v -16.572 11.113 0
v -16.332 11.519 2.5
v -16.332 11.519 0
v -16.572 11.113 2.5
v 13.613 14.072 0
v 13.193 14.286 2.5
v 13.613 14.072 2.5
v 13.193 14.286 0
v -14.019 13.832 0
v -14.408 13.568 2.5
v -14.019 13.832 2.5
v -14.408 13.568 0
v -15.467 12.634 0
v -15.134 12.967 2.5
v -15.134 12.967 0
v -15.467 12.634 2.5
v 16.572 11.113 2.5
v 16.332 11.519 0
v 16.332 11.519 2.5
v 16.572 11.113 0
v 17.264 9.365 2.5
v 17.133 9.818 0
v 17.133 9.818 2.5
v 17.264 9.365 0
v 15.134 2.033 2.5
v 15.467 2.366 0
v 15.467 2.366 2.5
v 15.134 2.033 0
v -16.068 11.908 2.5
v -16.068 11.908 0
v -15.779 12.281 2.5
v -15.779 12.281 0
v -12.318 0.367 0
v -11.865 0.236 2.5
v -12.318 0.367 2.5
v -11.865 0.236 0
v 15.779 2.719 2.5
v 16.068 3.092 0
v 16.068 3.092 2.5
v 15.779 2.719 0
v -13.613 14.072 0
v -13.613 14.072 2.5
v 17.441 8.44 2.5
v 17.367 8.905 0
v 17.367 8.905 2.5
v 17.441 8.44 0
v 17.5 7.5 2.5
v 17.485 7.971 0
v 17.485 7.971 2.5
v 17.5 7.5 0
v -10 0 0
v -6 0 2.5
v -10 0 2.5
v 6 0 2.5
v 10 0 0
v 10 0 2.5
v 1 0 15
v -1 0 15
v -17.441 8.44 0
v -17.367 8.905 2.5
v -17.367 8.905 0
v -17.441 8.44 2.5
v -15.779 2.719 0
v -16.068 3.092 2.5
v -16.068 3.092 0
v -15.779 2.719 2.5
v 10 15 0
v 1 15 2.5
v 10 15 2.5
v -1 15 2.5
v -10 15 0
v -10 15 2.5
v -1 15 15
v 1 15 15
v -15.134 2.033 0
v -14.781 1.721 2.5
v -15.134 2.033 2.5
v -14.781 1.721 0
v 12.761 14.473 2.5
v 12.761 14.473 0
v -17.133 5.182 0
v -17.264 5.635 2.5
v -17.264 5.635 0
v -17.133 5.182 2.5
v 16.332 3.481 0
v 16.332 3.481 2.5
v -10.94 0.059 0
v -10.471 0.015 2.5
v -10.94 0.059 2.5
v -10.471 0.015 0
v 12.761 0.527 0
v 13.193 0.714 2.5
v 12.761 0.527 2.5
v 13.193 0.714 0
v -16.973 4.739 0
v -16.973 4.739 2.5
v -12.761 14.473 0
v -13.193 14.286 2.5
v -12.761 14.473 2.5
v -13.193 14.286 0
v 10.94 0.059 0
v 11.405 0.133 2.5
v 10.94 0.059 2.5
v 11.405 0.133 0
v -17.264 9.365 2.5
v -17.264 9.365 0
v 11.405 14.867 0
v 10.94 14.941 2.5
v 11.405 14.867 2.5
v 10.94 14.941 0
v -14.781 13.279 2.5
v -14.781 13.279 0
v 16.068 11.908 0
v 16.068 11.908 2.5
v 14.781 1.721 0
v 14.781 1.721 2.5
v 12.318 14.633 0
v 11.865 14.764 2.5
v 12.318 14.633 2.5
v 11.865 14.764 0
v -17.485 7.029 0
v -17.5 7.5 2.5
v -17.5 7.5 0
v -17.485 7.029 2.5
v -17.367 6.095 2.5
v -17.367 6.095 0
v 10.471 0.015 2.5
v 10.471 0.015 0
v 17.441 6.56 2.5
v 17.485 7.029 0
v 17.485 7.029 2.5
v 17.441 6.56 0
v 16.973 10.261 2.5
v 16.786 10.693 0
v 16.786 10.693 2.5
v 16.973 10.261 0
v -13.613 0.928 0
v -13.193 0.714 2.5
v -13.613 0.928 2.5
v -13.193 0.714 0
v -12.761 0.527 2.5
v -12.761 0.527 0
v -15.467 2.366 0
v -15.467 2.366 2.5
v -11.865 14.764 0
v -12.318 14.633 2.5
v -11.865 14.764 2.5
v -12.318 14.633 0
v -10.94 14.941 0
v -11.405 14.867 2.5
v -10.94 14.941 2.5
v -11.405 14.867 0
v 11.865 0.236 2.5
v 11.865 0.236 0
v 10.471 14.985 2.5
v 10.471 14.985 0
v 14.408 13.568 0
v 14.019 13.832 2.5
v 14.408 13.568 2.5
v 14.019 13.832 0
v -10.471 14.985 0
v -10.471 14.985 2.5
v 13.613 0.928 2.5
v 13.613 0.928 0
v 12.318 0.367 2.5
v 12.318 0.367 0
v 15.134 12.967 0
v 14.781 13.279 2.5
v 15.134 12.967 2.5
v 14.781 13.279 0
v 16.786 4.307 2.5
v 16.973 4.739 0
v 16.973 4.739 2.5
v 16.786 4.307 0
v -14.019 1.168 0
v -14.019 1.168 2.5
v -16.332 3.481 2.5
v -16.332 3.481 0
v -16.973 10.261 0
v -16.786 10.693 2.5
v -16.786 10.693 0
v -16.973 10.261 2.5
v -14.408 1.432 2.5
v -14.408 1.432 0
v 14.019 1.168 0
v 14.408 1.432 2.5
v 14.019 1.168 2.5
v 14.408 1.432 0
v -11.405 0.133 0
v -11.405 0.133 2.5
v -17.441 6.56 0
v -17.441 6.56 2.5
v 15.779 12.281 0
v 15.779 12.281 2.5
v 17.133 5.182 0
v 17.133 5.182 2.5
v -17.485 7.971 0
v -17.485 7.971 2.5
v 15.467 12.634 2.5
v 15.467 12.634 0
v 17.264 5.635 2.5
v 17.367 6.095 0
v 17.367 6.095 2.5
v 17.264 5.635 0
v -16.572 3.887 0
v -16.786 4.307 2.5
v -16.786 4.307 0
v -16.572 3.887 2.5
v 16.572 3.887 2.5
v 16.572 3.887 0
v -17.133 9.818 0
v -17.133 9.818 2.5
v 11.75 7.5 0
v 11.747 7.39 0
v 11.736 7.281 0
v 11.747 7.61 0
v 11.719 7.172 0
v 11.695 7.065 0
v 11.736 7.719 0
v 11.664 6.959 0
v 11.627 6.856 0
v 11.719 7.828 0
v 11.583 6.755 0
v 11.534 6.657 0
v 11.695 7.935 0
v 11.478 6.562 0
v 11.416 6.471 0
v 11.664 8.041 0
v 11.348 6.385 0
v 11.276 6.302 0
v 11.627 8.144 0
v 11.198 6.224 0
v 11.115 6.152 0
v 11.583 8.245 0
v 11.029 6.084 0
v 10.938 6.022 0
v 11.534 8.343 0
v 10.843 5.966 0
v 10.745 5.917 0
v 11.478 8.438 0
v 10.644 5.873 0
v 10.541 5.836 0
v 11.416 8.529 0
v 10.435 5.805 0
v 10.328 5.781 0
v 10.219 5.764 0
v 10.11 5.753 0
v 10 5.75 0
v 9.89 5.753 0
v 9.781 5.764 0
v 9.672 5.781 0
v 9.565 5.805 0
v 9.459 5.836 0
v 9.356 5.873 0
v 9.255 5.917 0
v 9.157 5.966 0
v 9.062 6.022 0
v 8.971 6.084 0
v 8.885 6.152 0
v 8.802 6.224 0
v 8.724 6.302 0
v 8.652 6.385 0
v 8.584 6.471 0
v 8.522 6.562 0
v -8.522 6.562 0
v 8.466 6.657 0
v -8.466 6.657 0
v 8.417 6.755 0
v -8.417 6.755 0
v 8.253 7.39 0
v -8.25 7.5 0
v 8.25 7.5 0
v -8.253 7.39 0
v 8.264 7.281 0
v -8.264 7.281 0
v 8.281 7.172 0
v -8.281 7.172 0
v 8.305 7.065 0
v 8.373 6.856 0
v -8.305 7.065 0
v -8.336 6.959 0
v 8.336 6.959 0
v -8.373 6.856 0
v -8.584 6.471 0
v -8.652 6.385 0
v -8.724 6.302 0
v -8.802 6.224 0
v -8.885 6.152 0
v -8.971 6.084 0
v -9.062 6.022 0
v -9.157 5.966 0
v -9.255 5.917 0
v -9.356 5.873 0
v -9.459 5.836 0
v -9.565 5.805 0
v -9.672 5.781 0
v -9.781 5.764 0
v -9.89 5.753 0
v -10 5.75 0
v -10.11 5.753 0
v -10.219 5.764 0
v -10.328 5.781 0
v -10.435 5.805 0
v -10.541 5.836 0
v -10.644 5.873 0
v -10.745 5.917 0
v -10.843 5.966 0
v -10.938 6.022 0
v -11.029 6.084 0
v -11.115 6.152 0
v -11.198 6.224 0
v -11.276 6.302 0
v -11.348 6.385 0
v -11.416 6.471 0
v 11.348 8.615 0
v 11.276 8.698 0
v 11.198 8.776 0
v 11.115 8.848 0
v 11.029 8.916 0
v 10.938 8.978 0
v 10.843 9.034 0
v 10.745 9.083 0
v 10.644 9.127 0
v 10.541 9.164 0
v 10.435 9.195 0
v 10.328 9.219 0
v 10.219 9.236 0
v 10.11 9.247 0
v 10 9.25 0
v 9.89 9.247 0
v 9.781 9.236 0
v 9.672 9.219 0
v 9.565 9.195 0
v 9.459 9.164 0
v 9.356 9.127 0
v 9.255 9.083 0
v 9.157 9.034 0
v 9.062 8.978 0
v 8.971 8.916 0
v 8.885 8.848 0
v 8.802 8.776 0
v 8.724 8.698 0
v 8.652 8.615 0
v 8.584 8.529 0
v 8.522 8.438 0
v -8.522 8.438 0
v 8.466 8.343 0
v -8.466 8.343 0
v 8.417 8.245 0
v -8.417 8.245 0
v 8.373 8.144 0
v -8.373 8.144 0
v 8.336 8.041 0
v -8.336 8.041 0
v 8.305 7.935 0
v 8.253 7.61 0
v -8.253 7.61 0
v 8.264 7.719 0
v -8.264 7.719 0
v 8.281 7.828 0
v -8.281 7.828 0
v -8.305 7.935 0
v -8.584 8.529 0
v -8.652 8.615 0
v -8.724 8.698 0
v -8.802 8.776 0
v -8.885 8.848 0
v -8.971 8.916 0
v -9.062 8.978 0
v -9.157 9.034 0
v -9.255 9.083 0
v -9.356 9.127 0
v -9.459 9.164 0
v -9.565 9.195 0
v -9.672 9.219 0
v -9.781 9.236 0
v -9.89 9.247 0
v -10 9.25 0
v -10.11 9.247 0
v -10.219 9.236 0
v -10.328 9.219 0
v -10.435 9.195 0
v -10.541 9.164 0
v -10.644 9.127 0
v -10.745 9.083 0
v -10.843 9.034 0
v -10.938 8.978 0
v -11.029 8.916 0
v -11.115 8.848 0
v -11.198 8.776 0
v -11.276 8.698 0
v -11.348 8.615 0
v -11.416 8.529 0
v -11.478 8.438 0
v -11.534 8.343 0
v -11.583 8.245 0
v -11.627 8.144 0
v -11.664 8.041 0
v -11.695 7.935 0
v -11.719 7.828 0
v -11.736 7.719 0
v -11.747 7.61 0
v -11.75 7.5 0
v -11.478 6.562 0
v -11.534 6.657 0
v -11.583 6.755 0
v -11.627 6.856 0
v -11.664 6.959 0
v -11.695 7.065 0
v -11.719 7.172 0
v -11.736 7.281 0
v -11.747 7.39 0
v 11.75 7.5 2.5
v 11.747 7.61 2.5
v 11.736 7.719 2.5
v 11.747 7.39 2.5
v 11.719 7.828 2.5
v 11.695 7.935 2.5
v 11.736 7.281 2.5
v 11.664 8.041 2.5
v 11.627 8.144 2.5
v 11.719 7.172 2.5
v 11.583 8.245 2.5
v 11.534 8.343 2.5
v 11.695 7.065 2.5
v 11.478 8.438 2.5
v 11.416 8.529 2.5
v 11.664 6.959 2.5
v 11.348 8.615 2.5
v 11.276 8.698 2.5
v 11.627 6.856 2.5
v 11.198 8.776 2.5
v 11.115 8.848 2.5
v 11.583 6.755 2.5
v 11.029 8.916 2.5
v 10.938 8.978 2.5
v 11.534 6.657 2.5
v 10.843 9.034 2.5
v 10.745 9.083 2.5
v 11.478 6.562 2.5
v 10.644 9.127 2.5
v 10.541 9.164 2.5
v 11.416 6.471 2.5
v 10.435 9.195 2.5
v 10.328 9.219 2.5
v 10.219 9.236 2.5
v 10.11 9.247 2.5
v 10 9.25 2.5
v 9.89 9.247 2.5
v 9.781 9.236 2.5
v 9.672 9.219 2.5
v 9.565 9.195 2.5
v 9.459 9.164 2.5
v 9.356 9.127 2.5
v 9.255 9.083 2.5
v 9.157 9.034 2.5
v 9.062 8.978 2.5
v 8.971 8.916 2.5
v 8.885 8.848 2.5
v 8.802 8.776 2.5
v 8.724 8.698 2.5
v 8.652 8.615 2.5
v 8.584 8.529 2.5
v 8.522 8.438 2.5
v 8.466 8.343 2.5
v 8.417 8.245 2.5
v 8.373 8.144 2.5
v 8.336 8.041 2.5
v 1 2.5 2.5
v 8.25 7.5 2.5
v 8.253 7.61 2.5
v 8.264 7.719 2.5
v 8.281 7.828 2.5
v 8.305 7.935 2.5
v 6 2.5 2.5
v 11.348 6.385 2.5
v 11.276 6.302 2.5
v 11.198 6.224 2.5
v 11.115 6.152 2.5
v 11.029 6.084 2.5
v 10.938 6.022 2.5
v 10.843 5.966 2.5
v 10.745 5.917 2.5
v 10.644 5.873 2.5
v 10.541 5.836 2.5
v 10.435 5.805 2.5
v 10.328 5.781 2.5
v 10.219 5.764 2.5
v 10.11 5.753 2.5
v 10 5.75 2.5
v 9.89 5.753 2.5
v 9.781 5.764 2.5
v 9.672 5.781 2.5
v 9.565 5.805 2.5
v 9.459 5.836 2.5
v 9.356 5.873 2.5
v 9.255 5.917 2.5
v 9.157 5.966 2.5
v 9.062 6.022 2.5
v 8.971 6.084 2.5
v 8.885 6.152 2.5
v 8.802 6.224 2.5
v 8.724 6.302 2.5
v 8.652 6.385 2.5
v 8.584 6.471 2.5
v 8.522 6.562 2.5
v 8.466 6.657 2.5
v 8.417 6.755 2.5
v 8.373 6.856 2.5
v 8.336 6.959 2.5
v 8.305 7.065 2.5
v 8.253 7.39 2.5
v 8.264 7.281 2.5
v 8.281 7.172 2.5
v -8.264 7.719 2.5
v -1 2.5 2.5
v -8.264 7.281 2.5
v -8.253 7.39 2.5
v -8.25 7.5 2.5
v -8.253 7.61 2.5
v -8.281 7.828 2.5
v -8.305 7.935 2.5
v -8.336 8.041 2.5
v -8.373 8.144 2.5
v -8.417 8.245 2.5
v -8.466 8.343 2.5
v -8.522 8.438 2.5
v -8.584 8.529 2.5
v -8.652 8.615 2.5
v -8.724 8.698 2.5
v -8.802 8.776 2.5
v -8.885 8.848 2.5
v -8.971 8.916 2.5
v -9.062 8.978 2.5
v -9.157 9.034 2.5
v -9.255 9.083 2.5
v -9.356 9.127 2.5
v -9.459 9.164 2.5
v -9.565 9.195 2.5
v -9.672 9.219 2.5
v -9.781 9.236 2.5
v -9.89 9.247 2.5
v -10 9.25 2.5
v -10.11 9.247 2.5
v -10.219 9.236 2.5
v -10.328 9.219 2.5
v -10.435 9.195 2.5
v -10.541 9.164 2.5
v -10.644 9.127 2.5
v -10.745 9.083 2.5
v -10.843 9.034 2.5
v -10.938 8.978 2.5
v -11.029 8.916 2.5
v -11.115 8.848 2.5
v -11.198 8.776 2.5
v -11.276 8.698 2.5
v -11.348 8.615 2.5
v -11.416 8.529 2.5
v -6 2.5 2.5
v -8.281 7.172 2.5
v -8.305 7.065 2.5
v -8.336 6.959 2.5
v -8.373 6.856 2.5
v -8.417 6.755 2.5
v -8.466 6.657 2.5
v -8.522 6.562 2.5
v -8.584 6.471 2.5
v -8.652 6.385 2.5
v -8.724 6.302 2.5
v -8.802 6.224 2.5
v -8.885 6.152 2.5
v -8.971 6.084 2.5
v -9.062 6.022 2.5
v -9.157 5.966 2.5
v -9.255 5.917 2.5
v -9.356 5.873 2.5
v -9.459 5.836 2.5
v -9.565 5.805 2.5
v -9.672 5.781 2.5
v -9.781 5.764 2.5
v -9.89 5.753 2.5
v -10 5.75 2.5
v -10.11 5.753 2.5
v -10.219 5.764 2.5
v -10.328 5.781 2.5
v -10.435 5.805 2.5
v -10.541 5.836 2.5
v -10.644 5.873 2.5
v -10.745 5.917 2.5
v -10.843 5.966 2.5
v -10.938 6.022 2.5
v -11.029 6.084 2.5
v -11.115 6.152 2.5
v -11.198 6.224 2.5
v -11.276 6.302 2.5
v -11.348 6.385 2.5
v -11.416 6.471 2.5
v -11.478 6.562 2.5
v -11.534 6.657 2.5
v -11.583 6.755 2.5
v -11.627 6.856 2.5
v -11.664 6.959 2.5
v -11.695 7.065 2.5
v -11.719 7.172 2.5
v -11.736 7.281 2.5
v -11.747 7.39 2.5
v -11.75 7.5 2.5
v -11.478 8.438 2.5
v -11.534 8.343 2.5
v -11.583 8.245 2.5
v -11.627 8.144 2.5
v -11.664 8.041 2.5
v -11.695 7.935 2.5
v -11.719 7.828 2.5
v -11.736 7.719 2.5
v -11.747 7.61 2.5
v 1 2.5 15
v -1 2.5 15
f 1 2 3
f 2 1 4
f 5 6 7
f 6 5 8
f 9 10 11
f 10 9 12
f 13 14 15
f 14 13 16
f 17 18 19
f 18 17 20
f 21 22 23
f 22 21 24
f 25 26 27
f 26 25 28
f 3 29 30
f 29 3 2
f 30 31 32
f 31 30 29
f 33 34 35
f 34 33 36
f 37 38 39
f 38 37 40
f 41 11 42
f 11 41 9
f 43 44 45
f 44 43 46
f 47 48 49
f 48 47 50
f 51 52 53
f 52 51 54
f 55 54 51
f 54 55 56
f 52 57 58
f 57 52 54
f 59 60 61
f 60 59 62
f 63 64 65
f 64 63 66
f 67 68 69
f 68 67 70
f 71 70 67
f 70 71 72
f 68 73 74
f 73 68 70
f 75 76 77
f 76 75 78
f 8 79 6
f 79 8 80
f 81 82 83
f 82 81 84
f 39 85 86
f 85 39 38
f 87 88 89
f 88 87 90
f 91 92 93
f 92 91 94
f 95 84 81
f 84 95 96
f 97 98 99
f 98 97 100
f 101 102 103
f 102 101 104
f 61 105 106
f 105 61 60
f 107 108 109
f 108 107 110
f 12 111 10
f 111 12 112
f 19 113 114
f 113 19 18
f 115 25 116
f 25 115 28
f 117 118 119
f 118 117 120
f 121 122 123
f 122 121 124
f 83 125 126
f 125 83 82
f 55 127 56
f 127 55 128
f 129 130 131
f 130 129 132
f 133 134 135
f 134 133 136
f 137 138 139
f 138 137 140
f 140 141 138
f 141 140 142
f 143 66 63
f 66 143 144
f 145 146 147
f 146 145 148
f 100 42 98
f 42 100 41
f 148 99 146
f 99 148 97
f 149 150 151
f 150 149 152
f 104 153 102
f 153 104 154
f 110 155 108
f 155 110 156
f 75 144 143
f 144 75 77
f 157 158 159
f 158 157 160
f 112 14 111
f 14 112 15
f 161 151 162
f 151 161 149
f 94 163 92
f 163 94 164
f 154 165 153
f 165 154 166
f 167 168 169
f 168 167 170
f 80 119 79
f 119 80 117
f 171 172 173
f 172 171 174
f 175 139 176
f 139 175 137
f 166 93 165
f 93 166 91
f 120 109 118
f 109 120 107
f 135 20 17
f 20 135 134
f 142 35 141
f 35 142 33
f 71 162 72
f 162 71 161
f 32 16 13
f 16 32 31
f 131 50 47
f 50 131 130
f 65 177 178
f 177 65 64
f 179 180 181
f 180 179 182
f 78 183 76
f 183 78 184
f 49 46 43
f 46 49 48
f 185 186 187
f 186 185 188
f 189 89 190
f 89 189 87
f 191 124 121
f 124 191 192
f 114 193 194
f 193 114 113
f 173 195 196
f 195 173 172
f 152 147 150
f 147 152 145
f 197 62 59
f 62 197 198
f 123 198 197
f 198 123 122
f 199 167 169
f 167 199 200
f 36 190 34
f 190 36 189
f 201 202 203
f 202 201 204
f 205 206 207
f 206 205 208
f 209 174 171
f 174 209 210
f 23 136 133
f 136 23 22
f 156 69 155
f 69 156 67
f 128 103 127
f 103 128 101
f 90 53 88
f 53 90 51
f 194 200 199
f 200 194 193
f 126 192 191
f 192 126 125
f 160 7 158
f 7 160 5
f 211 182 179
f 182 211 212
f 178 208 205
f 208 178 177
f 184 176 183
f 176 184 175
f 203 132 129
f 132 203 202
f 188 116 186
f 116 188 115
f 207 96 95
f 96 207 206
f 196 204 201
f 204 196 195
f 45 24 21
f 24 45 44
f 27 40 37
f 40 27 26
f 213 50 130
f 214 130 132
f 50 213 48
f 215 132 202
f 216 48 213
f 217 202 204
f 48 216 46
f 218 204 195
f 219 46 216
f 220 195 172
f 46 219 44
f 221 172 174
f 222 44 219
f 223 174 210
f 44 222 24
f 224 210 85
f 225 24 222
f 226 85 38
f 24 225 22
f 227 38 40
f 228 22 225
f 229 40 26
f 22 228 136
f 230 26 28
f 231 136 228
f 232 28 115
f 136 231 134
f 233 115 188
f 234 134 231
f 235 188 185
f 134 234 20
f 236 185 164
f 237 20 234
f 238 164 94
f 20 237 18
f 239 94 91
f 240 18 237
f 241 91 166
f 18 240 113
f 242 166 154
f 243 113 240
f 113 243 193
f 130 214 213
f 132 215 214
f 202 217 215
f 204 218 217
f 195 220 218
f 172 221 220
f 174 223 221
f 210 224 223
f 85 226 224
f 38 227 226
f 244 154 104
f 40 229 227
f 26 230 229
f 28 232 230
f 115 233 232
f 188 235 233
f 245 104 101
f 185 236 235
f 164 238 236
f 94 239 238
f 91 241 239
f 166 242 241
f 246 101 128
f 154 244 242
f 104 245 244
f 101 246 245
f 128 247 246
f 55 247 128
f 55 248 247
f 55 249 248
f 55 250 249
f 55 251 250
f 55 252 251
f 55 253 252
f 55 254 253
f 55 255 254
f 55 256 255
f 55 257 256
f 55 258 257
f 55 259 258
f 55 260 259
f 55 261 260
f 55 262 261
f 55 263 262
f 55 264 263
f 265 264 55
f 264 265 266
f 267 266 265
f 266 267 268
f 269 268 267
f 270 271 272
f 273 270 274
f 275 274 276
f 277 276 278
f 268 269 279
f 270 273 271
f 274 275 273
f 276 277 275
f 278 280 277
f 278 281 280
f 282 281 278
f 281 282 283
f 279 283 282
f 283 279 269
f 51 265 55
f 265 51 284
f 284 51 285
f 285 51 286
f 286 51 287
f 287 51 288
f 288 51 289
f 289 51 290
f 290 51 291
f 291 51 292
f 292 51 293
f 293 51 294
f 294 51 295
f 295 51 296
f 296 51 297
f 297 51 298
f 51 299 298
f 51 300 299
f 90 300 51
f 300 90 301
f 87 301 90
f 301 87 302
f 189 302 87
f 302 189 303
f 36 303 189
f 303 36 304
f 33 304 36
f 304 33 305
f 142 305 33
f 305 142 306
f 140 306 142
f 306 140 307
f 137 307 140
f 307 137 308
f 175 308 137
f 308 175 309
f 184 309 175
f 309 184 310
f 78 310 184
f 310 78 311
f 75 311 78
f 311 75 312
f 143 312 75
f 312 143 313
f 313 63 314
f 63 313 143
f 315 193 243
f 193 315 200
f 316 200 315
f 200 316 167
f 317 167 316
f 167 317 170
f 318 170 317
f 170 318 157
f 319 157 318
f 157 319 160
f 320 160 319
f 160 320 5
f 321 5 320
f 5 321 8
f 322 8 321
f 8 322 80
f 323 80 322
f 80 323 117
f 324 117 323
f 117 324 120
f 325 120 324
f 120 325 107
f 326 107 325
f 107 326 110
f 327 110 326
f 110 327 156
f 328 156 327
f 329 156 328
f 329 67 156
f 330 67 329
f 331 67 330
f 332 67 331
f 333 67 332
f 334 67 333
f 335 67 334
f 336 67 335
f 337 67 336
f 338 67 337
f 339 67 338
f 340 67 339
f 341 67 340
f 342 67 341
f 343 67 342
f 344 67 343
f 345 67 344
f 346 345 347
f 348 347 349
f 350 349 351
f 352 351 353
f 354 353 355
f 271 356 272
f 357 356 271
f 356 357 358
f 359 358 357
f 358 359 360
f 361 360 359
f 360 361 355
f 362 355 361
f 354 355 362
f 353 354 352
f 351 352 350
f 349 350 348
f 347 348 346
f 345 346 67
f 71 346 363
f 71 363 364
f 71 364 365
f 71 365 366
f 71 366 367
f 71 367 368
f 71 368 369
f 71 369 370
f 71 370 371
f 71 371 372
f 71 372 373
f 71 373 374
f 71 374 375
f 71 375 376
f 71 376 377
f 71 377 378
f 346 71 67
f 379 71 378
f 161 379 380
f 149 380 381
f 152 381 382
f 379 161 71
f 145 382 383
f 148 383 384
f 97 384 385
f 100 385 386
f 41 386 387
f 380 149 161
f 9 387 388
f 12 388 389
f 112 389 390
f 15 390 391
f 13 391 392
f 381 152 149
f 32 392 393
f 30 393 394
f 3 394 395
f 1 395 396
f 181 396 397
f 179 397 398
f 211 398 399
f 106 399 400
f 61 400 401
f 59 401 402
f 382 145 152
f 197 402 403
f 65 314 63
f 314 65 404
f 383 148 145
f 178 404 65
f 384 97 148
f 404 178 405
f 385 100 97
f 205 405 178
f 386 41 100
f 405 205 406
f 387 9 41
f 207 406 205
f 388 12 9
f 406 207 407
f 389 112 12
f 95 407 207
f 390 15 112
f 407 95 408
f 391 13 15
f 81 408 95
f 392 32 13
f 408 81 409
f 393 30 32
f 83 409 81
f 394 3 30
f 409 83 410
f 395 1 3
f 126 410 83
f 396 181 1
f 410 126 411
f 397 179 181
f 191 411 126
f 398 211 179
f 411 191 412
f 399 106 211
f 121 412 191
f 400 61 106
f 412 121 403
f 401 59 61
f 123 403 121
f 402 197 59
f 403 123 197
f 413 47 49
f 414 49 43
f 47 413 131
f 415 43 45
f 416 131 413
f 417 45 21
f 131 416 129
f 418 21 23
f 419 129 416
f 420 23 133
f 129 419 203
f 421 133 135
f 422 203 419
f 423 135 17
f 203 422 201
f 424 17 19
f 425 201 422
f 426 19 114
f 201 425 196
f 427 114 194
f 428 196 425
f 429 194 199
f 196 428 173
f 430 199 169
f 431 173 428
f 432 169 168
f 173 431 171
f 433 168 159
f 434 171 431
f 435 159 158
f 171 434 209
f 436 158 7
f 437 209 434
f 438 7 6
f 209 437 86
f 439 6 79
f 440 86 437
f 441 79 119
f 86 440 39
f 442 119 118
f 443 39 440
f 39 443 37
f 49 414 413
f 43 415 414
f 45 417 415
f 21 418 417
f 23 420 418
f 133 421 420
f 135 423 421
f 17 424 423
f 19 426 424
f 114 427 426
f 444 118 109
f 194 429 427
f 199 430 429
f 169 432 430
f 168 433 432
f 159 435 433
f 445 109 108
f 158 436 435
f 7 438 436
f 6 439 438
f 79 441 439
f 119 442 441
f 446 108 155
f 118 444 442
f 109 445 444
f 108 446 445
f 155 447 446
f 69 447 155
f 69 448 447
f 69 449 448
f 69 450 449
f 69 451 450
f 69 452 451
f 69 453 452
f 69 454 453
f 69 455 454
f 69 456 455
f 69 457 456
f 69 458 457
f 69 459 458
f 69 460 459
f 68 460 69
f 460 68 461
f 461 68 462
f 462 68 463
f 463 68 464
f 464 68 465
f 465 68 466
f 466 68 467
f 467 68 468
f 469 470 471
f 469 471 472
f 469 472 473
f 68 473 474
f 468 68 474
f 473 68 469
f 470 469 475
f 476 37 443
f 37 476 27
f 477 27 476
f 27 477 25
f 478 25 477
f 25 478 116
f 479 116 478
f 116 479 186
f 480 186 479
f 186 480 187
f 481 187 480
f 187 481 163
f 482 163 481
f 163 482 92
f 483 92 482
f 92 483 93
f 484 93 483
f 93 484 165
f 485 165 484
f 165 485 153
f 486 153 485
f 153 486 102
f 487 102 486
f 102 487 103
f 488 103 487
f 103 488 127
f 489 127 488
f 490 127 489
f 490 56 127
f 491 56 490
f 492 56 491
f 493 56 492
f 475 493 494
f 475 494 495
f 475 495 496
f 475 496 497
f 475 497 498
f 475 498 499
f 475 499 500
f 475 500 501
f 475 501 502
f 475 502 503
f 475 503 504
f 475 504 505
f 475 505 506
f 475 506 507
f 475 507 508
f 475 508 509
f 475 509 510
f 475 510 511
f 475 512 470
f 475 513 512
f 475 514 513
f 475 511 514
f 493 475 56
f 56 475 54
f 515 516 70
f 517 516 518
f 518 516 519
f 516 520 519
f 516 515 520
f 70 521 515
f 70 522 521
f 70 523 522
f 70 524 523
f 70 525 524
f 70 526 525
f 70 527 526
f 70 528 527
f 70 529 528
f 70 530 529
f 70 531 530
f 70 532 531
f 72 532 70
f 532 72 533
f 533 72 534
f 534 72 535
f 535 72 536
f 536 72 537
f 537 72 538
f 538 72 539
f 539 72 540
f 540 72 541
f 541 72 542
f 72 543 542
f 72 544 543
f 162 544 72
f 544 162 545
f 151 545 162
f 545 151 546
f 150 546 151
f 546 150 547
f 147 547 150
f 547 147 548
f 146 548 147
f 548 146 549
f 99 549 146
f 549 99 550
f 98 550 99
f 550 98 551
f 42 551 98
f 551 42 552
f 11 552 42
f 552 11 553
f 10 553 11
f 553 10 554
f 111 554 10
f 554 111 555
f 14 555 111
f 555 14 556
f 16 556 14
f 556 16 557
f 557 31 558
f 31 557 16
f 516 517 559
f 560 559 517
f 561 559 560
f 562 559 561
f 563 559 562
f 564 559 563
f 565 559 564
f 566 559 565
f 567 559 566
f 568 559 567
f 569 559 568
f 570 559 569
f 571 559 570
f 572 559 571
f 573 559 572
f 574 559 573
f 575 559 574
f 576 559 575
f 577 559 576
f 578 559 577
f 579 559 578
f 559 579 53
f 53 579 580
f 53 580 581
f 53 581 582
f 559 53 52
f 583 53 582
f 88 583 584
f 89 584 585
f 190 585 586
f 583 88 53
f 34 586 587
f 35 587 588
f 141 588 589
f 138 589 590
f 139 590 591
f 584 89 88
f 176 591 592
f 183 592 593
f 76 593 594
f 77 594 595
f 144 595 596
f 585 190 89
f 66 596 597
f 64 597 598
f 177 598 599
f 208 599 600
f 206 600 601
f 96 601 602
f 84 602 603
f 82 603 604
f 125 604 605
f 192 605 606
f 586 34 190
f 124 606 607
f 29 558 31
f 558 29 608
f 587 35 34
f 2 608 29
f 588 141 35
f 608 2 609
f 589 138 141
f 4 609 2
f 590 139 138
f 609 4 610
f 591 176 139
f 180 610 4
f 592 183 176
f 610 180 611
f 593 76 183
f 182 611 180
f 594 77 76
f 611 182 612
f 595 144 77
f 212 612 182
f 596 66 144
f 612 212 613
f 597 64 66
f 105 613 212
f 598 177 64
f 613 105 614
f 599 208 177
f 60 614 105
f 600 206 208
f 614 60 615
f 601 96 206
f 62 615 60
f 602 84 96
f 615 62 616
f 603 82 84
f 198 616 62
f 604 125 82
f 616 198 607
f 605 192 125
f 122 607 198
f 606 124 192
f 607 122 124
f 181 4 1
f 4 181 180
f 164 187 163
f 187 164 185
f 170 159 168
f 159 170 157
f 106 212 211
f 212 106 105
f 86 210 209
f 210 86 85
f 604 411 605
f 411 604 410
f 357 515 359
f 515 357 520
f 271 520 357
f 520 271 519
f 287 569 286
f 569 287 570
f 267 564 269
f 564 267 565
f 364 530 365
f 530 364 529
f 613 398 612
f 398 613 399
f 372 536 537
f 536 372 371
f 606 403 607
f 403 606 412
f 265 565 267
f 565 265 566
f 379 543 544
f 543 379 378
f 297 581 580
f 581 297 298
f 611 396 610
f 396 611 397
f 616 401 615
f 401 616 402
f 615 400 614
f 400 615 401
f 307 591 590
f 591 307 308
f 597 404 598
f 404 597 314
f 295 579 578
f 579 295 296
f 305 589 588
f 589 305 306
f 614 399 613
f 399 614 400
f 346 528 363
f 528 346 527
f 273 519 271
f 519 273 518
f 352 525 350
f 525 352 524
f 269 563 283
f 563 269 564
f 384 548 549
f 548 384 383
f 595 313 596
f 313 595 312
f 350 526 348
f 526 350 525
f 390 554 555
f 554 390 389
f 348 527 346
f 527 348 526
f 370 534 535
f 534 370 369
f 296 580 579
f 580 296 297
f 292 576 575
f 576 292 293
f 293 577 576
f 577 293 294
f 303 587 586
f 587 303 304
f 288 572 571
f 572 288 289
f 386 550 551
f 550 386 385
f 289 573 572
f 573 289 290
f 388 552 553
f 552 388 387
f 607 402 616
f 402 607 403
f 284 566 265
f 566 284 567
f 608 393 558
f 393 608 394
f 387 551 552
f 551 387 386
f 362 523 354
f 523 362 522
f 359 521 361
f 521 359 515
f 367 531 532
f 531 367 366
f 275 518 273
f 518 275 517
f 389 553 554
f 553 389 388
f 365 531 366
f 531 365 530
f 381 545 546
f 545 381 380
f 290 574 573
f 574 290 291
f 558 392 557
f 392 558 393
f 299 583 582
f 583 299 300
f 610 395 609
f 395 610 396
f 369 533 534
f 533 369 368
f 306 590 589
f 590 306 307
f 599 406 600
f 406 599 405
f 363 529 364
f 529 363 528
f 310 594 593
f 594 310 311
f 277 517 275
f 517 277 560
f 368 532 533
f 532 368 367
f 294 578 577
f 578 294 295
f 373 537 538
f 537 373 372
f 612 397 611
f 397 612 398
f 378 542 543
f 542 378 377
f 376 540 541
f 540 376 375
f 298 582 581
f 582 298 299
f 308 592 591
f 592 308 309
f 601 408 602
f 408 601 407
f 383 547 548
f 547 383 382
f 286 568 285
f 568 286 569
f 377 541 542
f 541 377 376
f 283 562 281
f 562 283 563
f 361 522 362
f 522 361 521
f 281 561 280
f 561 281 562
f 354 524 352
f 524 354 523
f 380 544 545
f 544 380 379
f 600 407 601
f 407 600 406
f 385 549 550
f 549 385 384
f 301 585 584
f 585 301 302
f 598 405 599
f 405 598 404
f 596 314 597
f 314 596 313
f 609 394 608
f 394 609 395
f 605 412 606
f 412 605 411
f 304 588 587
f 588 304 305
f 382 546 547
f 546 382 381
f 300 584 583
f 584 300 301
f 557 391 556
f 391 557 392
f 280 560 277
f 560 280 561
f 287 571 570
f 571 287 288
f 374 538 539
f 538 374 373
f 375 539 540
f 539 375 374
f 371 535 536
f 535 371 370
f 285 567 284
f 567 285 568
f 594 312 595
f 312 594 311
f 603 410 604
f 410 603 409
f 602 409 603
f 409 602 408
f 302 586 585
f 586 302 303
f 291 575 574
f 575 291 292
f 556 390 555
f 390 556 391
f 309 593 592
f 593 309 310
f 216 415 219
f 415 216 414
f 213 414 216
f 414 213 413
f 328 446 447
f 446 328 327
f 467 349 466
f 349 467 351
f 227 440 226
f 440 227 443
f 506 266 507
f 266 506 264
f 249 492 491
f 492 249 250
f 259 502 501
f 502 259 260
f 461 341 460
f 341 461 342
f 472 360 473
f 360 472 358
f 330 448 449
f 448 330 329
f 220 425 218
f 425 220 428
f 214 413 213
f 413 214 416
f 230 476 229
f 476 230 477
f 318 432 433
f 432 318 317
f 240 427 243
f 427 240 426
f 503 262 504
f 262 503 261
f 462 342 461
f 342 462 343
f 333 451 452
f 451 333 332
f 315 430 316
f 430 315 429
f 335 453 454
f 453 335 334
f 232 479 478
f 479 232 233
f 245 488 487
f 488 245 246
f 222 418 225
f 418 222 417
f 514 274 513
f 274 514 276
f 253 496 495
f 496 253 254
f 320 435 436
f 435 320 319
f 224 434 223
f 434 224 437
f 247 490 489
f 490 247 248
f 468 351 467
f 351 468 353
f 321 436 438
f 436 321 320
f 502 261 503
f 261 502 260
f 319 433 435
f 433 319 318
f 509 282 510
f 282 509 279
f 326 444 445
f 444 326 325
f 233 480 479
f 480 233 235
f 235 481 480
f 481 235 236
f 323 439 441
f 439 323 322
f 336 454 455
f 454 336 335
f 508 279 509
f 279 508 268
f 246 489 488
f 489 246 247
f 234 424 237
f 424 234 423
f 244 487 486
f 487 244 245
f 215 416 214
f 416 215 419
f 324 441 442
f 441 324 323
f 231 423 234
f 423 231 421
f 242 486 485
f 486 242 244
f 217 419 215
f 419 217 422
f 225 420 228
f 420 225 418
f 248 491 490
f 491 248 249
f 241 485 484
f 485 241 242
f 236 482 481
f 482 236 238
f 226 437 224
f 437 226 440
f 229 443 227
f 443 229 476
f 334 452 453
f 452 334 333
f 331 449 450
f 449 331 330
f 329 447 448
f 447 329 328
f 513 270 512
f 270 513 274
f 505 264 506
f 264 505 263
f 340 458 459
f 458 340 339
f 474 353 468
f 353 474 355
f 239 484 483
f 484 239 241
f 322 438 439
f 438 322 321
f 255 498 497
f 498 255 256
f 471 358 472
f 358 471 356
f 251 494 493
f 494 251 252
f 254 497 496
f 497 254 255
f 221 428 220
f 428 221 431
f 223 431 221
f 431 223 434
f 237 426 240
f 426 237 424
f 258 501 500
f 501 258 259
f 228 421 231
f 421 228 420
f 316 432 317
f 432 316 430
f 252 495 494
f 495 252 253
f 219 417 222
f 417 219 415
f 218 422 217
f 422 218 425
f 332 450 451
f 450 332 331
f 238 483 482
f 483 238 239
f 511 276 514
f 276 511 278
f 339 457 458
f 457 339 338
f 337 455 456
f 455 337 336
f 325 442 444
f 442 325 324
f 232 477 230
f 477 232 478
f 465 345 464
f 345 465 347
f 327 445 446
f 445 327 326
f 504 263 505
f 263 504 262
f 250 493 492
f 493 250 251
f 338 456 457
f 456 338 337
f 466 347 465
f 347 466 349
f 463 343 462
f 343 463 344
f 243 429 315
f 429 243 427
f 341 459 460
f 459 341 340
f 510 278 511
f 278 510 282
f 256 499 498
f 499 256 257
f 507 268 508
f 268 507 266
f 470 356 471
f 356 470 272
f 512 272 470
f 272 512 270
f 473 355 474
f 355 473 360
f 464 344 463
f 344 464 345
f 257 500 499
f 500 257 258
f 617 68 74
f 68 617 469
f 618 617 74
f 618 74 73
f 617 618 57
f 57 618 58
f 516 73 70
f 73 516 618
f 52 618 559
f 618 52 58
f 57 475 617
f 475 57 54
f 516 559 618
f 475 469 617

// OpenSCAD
$fn=100;

module y_endstop_insert()
{
    difference()
    {
        hull()
        {
            translate([-10,7.5,0])
                cylinder(d=15,h=2.5);
            translate([10,7.5,0])
                cylinder(d=15,h=2.5);
        }
        translate([-10,7.5,-0.001])
            cylinder(d=3.5,h=2.502);
        translate([10,7.5,-0.001])
            cylinder(d=3.5,h=2.502);
    }    
    translate([-1,0,0])
        cube([2,15,15]);

    hull()
    {
        translate([-1,0,14])
            cube([2,2.5,1]);
        translate([-6,0,0])
            cube([12,2.5,2.5]);
    }
}

y_endstop_insert();
